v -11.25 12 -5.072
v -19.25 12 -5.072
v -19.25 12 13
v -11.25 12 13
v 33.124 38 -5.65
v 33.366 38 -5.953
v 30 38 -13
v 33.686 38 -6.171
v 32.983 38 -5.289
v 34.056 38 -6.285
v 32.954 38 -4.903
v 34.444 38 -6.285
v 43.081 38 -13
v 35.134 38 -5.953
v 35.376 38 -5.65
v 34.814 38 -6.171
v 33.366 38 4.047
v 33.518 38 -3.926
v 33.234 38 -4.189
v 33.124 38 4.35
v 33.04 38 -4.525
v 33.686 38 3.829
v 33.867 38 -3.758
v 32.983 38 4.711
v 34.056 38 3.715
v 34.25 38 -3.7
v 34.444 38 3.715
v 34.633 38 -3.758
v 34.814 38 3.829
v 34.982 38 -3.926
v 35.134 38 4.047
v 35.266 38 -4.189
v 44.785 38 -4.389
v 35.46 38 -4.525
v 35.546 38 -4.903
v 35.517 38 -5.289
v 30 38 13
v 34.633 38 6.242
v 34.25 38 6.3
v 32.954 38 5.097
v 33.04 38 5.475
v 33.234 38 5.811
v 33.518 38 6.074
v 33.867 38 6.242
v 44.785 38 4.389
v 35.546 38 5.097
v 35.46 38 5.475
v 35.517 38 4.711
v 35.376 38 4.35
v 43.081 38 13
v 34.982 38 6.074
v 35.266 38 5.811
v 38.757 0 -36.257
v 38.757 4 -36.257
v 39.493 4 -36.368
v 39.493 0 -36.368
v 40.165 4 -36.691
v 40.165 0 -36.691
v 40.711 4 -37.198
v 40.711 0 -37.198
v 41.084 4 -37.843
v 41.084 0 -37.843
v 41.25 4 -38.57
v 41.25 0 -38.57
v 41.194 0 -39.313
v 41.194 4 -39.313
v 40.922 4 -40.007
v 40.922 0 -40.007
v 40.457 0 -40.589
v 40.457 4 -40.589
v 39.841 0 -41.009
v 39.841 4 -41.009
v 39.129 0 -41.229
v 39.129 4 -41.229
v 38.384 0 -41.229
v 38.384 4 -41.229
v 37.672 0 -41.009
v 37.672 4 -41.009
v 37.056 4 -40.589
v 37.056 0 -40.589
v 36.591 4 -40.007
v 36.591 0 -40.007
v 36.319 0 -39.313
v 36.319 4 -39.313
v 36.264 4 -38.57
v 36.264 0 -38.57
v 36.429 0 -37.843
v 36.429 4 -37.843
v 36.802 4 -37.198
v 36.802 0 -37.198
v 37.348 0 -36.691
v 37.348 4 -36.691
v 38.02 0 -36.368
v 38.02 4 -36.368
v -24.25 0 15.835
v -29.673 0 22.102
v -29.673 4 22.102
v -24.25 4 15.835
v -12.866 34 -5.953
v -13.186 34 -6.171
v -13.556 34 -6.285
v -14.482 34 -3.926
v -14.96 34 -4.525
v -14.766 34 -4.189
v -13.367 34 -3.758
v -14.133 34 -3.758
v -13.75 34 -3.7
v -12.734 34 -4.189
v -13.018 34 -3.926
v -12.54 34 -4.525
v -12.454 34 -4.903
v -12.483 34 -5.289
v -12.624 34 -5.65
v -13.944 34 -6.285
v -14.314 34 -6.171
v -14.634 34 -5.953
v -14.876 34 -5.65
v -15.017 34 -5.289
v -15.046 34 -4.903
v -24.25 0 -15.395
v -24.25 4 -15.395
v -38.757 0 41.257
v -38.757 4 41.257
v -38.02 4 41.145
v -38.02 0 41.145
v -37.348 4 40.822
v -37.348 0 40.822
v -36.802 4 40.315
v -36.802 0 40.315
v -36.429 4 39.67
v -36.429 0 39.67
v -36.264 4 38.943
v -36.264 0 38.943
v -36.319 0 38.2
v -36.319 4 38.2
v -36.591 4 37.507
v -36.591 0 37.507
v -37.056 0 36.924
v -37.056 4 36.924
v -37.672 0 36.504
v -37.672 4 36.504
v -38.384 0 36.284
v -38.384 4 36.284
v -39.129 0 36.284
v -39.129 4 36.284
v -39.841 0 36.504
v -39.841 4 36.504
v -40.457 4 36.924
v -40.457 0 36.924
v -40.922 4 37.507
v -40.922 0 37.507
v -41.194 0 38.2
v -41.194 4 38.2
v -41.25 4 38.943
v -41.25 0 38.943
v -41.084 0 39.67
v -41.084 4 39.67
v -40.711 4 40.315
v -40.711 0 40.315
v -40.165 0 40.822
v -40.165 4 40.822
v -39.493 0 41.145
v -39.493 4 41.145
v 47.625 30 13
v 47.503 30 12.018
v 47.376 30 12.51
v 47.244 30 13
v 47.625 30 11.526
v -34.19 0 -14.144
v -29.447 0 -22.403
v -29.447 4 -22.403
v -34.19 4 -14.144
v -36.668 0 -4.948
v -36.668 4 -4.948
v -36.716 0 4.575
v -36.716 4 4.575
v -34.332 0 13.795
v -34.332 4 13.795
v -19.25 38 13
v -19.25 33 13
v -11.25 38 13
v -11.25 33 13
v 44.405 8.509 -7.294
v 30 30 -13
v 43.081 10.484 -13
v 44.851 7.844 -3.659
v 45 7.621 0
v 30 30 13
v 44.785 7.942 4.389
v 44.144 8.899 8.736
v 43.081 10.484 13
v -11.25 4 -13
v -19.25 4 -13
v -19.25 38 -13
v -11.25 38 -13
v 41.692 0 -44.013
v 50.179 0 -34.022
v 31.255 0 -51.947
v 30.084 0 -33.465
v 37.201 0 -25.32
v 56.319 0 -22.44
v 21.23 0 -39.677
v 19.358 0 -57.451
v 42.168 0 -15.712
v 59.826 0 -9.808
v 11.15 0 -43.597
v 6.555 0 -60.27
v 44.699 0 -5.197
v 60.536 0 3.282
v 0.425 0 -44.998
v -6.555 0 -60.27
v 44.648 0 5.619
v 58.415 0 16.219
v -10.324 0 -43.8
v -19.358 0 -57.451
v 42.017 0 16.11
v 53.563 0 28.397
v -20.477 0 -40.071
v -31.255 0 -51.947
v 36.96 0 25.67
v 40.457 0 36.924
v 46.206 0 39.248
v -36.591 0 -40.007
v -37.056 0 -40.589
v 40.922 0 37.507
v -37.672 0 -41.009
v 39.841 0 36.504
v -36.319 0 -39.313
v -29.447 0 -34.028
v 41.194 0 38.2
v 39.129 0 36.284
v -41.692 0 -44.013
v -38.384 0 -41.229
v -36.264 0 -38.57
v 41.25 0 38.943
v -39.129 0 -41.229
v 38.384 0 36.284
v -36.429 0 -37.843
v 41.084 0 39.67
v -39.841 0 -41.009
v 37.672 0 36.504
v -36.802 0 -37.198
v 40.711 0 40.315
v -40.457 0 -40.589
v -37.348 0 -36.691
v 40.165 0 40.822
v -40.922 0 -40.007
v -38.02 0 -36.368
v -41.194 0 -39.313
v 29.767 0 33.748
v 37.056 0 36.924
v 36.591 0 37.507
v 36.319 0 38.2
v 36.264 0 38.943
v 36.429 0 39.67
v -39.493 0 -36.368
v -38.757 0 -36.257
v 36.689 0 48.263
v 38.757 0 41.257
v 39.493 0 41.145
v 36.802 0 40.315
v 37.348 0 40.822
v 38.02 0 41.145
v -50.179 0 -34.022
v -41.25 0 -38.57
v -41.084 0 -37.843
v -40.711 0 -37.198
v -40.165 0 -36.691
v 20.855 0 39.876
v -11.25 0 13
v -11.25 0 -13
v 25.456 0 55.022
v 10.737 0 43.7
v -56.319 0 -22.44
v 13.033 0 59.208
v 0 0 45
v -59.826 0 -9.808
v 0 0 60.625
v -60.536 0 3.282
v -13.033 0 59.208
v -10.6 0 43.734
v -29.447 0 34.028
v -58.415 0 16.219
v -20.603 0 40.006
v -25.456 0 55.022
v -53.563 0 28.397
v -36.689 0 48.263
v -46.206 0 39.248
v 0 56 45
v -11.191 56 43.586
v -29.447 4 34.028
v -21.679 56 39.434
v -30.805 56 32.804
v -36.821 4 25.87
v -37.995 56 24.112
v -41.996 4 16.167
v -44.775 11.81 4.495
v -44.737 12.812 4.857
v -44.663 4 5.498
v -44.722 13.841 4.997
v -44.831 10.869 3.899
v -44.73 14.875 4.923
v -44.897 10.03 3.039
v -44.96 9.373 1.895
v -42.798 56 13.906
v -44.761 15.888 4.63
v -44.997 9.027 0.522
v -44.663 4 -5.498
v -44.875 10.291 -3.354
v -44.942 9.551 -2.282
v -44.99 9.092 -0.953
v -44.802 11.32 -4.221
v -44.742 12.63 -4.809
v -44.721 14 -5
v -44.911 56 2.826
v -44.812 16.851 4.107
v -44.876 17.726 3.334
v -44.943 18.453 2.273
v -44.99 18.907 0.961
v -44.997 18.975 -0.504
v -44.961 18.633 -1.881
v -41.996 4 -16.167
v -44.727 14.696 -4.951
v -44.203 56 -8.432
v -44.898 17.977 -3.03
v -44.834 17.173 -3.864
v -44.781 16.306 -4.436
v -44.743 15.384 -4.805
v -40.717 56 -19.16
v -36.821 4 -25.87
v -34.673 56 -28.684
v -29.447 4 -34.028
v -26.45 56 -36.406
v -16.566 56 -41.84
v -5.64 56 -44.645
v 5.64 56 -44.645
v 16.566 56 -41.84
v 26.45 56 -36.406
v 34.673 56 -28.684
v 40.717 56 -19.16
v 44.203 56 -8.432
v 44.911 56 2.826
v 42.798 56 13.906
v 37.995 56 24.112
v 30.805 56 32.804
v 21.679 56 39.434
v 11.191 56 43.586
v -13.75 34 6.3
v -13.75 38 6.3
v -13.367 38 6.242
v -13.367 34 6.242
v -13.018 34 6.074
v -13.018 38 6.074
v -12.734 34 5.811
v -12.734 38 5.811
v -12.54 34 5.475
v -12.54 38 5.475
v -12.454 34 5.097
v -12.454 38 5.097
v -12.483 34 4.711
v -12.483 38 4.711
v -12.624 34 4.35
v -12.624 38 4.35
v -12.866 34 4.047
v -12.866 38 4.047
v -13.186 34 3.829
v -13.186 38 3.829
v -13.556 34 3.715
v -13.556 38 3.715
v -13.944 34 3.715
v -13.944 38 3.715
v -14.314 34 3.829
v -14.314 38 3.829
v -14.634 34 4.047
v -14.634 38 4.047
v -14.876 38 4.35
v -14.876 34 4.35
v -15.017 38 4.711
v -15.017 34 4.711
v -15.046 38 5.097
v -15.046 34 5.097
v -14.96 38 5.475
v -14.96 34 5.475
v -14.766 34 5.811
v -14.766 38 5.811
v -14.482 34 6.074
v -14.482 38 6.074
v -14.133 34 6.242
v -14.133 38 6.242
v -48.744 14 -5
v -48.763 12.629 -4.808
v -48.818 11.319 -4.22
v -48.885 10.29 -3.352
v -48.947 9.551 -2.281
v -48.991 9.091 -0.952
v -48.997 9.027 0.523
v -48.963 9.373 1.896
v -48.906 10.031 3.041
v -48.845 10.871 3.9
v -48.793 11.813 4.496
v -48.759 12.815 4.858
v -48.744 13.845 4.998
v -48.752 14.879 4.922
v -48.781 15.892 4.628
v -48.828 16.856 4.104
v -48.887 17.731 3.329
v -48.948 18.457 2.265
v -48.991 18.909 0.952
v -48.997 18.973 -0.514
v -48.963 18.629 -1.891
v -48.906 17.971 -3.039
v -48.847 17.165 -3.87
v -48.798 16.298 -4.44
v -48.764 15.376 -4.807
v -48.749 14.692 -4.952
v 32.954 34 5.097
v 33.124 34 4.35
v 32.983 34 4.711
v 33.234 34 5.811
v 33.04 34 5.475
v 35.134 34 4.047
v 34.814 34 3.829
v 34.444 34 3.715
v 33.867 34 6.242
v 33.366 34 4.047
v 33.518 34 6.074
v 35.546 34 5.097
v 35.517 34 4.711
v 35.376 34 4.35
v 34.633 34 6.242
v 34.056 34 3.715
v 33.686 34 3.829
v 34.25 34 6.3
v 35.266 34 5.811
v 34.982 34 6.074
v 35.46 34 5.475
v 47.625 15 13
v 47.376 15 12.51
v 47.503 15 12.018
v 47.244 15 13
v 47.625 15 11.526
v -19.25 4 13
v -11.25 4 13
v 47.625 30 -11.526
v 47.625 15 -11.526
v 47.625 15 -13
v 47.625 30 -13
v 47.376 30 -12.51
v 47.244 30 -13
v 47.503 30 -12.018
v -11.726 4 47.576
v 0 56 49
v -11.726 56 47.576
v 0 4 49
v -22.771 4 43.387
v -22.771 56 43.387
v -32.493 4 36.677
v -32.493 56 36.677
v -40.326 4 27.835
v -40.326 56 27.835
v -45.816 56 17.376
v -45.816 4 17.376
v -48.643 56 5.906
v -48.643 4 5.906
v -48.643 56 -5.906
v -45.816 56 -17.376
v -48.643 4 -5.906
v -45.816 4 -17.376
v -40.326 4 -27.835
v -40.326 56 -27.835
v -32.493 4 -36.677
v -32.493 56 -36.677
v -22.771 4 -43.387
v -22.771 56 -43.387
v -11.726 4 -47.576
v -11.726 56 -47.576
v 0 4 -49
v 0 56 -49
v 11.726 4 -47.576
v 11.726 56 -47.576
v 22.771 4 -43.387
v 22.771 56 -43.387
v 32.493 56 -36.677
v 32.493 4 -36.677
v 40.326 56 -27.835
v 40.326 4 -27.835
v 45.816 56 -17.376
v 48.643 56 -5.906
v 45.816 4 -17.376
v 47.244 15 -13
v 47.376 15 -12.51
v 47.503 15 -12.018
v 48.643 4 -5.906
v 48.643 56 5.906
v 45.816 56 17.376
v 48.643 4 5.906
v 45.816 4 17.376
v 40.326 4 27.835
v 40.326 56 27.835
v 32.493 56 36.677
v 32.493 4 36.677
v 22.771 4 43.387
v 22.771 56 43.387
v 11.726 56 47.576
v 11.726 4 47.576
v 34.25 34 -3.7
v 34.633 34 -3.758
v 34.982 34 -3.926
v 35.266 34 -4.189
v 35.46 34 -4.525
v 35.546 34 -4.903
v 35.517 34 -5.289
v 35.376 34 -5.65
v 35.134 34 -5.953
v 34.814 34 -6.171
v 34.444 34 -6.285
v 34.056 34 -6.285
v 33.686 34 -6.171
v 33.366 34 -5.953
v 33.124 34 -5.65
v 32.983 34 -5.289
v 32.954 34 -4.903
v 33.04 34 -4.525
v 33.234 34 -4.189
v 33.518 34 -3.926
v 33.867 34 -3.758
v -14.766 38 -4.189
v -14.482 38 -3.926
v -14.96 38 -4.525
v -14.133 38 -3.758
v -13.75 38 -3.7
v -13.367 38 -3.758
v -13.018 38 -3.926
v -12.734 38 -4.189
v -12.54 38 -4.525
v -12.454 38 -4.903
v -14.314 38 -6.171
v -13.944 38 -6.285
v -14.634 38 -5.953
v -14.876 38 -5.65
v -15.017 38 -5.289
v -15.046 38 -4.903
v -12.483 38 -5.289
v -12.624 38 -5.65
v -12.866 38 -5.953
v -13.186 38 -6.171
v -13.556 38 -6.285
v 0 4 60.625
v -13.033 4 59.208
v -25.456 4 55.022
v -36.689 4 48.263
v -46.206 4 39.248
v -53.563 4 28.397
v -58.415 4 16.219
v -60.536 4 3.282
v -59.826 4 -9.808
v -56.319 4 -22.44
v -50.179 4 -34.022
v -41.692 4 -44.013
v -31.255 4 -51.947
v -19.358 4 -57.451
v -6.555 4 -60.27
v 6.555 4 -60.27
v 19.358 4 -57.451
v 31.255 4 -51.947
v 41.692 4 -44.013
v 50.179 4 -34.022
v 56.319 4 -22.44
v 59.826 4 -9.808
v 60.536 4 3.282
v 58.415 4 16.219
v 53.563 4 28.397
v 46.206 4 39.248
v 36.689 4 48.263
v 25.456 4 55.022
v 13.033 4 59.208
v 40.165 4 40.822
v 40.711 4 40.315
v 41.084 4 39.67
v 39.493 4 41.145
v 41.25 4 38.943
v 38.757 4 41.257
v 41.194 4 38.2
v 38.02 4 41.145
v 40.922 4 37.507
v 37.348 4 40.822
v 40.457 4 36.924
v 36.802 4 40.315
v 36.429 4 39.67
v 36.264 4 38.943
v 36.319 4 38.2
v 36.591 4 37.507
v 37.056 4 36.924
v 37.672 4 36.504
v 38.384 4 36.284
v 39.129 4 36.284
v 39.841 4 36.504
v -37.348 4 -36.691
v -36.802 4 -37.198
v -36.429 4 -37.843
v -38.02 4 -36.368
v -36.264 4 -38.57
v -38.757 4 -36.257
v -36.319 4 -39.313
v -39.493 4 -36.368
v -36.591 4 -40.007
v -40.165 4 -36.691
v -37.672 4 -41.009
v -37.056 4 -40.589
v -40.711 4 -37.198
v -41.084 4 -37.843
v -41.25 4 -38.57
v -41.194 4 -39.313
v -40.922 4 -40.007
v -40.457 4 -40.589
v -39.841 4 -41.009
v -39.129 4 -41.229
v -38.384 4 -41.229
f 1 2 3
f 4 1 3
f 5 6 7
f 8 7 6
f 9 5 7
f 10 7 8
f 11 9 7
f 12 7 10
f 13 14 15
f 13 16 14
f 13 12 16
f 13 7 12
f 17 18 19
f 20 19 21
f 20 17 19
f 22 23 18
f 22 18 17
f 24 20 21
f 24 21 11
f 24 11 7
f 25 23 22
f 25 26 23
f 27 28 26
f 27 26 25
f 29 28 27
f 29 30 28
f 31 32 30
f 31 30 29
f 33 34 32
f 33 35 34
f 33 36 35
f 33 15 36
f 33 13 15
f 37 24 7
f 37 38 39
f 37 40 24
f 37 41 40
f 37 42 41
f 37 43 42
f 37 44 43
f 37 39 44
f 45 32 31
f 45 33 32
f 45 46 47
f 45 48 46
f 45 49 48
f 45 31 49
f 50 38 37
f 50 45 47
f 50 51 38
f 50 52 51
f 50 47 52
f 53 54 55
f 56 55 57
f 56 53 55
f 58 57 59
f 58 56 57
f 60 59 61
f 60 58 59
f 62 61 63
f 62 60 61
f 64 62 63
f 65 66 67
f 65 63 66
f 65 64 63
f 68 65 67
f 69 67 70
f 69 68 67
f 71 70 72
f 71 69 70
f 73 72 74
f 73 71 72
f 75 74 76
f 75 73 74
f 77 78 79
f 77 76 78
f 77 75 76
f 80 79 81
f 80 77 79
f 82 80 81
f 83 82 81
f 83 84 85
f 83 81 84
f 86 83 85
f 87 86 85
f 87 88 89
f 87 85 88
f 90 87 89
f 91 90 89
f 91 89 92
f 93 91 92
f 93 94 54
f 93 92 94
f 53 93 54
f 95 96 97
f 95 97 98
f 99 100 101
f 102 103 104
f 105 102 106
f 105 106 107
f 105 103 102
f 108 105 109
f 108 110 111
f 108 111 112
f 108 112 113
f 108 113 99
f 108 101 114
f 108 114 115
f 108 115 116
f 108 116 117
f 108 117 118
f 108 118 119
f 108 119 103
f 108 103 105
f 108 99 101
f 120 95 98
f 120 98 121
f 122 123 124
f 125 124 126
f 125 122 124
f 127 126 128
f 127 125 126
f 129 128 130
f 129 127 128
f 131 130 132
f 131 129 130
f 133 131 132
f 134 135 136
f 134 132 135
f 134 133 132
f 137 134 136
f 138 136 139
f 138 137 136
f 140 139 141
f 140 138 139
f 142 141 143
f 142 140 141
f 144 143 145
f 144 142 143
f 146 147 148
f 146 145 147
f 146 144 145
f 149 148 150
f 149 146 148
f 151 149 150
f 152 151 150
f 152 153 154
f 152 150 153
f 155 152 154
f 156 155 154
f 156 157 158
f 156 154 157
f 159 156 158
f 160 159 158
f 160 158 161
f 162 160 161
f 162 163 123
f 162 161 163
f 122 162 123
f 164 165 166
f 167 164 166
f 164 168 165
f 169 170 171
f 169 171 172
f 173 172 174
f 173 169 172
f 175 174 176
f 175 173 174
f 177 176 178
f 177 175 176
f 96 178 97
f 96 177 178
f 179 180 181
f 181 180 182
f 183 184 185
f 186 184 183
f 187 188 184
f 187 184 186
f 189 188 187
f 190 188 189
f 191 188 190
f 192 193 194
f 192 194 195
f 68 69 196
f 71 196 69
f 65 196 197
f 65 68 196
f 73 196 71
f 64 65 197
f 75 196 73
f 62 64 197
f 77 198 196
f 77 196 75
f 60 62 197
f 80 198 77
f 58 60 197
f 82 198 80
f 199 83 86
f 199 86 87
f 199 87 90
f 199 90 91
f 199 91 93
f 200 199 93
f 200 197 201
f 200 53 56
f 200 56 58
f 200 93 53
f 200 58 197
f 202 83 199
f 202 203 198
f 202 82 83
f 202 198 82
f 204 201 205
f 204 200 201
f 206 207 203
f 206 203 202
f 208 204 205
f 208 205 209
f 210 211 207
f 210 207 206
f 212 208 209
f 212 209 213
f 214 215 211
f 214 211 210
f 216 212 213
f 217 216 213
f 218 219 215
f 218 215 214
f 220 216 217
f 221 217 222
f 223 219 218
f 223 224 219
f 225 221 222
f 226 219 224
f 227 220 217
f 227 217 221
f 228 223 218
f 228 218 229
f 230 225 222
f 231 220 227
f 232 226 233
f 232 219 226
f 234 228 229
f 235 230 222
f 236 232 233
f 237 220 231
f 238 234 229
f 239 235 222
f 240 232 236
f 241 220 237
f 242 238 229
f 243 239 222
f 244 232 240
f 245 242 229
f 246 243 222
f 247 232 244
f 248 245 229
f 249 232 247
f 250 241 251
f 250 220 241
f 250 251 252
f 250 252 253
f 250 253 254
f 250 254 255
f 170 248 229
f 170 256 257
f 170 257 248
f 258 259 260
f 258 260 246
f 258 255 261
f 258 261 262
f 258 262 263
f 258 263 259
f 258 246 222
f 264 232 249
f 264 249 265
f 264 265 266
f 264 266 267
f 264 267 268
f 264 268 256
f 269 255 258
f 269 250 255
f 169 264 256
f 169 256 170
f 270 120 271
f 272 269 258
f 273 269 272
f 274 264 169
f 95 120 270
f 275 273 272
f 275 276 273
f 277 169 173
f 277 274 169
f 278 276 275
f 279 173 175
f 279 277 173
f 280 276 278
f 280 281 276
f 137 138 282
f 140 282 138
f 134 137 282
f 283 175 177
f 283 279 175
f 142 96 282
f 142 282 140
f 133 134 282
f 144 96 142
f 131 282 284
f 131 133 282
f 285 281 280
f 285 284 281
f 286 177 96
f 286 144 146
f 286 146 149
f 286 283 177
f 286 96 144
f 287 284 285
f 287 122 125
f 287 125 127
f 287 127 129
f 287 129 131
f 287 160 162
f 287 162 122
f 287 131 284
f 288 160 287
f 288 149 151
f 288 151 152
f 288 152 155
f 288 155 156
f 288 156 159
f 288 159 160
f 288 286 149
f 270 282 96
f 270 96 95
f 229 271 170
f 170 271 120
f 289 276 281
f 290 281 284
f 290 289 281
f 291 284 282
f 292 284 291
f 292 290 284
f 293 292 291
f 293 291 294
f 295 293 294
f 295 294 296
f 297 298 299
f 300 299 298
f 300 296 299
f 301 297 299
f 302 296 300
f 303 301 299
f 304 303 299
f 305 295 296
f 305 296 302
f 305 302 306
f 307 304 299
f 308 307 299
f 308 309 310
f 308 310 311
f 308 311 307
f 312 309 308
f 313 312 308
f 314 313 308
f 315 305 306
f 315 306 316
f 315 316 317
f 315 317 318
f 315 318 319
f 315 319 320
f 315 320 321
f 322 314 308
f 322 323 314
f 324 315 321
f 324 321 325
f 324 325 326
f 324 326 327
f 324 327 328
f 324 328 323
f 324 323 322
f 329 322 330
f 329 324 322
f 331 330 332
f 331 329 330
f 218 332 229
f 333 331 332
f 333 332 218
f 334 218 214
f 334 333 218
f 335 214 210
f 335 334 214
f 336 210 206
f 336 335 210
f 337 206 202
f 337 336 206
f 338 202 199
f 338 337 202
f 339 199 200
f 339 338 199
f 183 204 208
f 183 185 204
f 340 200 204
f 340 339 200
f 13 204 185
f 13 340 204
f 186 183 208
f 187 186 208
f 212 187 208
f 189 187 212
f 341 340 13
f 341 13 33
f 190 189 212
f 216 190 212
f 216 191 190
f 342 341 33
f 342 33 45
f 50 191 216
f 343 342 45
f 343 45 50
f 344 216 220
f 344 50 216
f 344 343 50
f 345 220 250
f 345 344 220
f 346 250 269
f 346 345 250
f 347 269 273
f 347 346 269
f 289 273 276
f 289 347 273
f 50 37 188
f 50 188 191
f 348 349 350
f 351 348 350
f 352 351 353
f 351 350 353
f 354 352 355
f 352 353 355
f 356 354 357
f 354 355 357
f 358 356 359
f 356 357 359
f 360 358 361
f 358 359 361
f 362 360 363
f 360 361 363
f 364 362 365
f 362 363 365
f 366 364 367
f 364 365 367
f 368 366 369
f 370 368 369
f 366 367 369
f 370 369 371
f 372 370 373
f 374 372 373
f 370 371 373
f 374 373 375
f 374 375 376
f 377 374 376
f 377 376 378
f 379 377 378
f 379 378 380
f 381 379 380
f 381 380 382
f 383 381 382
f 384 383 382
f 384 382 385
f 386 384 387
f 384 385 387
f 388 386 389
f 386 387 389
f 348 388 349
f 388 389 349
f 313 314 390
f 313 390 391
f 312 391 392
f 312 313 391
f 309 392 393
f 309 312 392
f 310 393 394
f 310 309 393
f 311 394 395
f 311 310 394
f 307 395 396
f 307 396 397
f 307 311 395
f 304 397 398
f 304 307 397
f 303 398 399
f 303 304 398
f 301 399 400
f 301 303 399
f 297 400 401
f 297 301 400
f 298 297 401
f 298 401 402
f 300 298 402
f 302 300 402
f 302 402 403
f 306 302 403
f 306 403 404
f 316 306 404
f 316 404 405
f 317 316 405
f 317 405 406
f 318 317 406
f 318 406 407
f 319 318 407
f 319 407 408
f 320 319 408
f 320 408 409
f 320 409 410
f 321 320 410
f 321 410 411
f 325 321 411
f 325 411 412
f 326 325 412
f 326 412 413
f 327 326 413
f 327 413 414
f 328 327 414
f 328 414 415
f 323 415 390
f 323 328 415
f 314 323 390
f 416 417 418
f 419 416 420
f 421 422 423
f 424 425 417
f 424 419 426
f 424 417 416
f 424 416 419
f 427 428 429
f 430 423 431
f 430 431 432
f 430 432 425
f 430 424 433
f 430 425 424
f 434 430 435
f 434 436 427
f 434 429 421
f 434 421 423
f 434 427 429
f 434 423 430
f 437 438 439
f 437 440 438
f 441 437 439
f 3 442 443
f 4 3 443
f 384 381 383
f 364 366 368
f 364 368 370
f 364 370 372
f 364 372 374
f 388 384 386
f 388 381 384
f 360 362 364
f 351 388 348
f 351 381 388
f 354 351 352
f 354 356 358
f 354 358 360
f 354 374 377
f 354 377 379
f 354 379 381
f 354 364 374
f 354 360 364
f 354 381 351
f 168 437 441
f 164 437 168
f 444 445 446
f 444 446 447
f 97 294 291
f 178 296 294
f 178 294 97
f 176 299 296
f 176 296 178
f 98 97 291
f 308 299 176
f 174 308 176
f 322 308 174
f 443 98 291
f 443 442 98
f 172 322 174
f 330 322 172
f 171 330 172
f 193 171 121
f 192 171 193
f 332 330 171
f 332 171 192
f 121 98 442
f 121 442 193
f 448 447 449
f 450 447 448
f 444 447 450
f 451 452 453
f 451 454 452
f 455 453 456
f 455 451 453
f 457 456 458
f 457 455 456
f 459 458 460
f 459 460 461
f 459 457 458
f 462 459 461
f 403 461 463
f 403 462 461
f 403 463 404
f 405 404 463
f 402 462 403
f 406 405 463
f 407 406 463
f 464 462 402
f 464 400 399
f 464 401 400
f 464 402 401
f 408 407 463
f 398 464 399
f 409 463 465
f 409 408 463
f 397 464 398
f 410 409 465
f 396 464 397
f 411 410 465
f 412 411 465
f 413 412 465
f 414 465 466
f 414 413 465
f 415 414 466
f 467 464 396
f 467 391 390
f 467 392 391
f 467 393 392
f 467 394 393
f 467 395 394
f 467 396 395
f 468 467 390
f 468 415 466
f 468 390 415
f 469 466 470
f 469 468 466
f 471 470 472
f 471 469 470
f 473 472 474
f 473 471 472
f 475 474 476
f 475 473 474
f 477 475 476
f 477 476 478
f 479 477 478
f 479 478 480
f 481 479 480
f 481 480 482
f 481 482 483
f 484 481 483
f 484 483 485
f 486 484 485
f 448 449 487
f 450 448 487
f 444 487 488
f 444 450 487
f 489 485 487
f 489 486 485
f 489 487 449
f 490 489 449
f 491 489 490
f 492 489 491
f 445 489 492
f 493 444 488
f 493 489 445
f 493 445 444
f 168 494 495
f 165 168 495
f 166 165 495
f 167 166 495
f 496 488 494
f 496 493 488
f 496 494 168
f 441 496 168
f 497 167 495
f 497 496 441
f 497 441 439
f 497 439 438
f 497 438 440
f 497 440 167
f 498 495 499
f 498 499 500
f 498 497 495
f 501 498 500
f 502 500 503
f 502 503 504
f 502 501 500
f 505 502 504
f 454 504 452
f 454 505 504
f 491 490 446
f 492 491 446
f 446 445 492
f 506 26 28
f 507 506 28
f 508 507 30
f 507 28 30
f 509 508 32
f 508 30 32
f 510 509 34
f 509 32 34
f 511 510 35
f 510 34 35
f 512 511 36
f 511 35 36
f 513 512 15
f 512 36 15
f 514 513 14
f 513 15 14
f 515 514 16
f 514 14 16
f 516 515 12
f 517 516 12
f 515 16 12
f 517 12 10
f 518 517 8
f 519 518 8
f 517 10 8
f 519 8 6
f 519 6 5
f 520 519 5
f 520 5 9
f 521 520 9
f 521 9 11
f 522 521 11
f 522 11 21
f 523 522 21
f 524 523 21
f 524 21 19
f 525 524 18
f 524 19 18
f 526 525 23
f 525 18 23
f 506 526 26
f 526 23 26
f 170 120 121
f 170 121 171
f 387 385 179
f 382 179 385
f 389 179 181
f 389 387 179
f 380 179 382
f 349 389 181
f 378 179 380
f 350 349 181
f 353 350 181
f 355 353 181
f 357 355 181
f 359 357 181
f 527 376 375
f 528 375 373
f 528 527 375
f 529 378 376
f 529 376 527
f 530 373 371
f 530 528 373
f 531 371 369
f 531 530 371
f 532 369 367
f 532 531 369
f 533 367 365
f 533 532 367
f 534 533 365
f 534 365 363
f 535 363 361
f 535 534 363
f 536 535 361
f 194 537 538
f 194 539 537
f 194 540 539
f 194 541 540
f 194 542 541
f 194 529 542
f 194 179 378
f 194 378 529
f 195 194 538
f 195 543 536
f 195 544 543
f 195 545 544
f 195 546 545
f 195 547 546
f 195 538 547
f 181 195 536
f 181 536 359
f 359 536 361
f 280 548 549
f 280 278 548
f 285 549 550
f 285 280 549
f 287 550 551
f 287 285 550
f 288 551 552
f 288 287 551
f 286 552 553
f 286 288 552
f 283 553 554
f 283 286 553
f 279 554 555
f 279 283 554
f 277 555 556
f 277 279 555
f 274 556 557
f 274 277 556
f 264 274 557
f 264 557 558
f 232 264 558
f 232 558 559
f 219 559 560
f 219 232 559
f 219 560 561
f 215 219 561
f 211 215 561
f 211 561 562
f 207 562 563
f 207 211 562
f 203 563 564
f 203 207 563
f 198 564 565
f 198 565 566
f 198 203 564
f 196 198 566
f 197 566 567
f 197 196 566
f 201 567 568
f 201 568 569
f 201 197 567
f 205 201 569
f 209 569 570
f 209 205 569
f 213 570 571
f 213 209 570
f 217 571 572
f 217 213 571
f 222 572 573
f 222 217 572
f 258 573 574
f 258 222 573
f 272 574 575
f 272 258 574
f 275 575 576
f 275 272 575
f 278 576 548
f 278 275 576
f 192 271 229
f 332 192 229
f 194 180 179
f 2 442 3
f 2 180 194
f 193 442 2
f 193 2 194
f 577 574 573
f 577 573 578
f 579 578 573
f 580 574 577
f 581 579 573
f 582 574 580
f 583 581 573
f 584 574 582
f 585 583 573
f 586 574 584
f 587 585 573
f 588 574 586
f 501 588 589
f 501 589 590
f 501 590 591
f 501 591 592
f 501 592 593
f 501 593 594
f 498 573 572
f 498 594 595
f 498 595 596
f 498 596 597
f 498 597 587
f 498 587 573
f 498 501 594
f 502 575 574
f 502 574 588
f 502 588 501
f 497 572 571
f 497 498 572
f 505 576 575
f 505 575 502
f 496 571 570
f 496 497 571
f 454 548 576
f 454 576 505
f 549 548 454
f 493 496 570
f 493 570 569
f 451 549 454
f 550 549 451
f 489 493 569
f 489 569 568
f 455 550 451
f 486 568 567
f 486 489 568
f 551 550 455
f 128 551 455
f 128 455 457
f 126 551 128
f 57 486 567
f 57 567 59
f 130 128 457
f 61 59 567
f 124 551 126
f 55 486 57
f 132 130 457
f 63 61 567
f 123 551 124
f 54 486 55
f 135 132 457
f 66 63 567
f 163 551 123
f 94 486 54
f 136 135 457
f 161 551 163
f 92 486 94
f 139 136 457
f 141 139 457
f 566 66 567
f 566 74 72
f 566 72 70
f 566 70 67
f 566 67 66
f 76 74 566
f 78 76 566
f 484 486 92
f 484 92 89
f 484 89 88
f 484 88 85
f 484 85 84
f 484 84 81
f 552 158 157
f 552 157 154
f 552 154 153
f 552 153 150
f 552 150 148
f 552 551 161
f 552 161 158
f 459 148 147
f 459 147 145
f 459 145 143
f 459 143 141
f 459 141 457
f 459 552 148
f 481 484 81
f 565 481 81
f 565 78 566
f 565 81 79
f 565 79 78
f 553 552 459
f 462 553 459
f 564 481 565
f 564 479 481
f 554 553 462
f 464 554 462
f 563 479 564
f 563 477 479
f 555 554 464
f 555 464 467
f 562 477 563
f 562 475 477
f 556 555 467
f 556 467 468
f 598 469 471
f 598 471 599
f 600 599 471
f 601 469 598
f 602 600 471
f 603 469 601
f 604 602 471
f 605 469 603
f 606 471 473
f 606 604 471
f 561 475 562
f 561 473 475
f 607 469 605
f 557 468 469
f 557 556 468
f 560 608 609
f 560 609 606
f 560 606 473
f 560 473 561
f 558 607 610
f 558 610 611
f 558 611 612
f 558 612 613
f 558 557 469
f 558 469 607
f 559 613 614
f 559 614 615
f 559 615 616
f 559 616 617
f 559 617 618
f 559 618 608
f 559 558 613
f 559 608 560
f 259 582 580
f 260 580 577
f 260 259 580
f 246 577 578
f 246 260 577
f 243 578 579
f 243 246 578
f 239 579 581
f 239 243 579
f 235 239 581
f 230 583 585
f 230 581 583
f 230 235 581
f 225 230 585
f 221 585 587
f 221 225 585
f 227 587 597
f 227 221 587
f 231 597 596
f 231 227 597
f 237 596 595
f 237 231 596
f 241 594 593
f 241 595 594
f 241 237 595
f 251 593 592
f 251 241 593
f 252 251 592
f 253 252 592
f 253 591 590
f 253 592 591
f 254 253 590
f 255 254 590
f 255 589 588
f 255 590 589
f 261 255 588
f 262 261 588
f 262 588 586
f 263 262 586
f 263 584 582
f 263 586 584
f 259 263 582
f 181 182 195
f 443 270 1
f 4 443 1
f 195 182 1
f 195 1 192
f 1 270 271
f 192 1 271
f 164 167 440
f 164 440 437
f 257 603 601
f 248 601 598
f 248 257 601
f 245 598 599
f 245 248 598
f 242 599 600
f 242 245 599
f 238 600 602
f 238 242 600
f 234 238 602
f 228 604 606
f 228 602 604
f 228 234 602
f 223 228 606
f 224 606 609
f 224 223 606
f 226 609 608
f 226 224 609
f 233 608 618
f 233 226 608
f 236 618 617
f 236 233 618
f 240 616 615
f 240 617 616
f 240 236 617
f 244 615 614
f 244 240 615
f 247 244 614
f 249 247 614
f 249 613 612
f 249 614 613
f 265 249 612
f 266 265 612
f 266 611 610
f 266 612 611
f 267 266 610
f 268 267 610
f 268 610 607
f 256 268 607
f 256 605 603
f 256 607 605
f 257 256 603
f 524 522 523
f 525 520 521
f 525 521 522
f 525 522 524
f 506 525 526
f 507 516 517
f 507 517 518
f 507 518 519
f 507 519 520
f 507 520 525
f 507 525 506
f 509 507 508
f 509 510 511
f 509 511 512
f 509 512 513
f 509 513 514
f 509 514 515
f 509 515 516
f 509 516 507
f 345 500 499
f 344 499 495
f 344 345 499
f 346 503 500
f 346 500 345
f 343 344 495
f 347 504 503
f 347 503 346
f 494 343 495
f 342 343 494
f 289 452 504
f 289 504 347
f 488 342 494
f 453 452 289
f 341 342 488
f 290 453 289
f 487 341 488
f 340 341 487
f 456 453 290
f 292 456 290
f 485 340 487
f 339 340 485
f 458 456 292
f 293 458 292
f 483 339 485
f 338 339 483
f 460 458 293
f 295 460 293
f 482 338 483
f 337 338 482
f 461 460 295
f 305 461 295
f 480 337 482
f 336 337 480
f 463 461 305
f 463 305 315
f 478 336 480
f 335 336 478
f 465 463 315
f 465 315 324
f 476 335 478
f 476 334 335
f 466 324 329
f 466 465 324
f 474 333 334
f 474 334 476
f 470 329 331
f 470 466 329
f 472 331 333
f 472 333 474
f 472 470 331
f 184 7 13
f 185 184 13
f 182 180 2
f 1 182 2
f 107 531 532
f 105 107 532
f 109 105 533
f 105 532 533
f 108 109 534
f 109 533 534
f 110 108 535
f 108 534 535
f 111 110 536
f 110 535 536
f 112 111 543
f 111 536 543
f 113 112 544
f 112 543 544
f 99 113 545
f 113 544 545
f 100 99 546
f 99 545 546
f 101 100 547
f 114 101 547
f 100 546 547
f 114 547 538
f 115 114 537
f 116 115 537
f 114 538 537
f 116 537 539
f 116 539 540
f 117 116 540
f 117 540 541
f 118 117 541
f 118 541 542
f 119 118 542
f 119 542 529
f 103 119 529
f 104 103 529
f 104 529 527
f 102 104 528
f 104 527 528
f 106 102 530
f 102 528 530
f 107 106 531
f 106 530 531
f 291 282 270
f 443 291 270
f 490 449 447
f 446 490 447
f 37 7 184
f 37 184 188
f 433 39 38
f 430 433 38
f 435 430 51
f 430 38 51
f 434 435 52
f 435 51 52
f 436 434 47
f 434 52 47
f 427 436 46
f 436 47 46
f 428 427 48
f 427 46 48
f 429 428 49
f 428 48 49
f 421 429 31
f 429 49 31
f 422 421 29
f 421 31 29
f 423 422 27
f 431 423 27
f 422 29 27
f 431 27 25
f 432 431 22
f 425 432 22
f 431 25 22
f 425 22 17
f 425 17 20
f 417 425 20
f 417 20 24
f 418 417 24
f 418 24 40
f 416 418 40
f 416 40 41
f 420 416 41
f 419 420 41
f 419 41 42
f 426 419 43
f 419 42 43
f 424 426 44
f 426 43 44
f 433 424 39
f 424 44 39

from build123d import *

# Parameters (mm, degrees)
IZIM7_W                     = 26
IZIM7_H                     = 8
Y_KSEKLIK_EKSTR_ZYON3_DEPTH = 15
IZIM8_W                     = 8
IZIM8_H                     = 26
Y_KSEKLIK_EKSTR_ZYON4_DEPTH = 4
IZIM9_W                     = 8
IZIM9_H                     = 26
Y_KSEKLIK_EKSTR_ZYON5_DEPTH = 38
IZIM11_R                    = 5
KES_EKSTR_ZYON1_DEPTH       = 44
IZIM12_R                    = 2.5
KES_EKSTR_ZYON2_DEPTH       = 44
IZIM14_R                    = 1.3
KES_EKSTR_ZYON3_DEPTH       = 4
KES_EKSTR_ZYON4_DEPTH       = 10
Y_KSEKLIK_EKSTR_ZYON6_DEPTH = 26
KES_EKSTR_ZYON5_DEPTH       = 30
Y_KSEKLIK_EKSTR_ZYON7_DEPTH = 26
Y_KSEKLIK_EKSTR_ZYON8_DEPTH = 26
KES_EKSTR_ZYON6_DEPTH       = 26


with BuildPart() as part:
    # Çizim1 → Döndür5 (revolve)
    with BuildSketch(Plane.XY, mode=Mode.PRIVATE) as d_nd_r5_sk:
        Polygon((49, 4), (60.625, 4), (60.625, 0), (45, 0), (45, 56), (49, 56), align=None)
    revolve(d_nd_r5_sk.sketch.rotate(Axis((0, 14.385693044, 0), (0, -1, 0)), 90), axis=Axis((0, 14.385693044, 0), (0, -1, 0)))

    # Çizim7 → Yükseklik-Ekstrüzyon3 (add)
    with BuildSketch(Plane.ZY.offset(-45)):
        with Locations((0, 34)):
            Rectangle(IZIM7_W, IZIM7_H)
    extrude(amount=Y_KSEKLIK_EKSTR_ZYON3_DEPTH)

    # Çizim8 → Yükseklik-Ekstrüzyon4 (add)
    with BuildSketch(Plane(origin=(0, 0, 0), x_dir=(1, 0, 0), z_dir=(0, 1, 0))):
        with Locations((-15.25, 0)):
            Rectangle(IZIM8_W, IZIM8_H)
        with BuildLine():
            Line((-11.25, 13), (-29.4469535, 34.027590711))
            ThreePointArc((-29.4469535, 34.027590711), (-45, 0), (-29.4469535, -34.027590711))
            Line((-29.4469535, -34.027590711), (-11.25, -13))
            Line((-11.25, -13), (-19.25, -13))
            Line((-19.25, -13), (-19.25, 13))
            Line((-19.25, 13), (-11.25, 13))
        make_face()
        with BuildLine():
            ThreePointArc((-29.4469535, 22.402609883), (-36.999521245, 0.188222241), (-29.673354544, -22.101855807))
            Line((-29.673354544, -22.101855807), (-24.25, -15.834868333))
            Line((-24.25, -15.834868333), (-24.25, 15.394791201))
            Line((-24.25, 15.394791201), (-29.4469535, 22.402609883))
        make_face(mode=Mode.SUBTRACT)
    extrude(amount=Y_KSEKLIK_EKSTR_ZYON4_DEPTH)

    # Çizim9 → Yükseklik-Ekstrüzyon5 (add)
    with BuildSketch(Plane(origin=(0, 0, 0), x_dir=(1, 0, 0), z_dir=(0, 1, 0))):
        with Locations((-15.25, 0)):
            Rectangle(IZIM9_W, IZIM9_H)
    extrude(amount=Y_KSEKLIK_EKSTR_ZYON5_DEPTH)

    # Çizim11 → Kes-Ekstrüzyon1 (cut)
    with BuildSketch(Plane.ZY.offset(19.25)):
        with Locations(Location((0, 14, 0), (0, 0, 180))):
            Circle(IZIM11_R)
    extrude(amount=KES_EKSTR_ZYON1_DEPTH, mode=Mode.SUBTRACT)

    # Çizim12 → Kes-Ekstrüzyon2 (cut)
    with BuildSketch(Plane(origin=(0, 0, 0), x_dir=(1, 0, 0), z_dir=(0, 1, 0))):
        with Locations(Location((-38.756522677, 38.756522677, 0), (0, 0, 270))):
            Circle(IZIM12_R)
        with Locations(Location((38.756522677, 38.756522677, 0), (0, 0, 270))):
            Circle(IZIM12_R)
        with Locations(Location((-38.756522677, -38.756522677, 0), (0, 0, 270))):
            Circle(IZIM12_R)
        with Locations(Location((38.756522677, -38.756522677, 0), (0, 0, 270))):
            Circle(IZIM12_R)
    extrude(amount=KES_EKSTR_ZYON2_DEPTH, mode=Mode.SUBTRACT)

    # Çizim14 → Kes-Ekstrüzyon3 (cut)
    with BuildSketch(Plane(origin=(0, 38, 0), x_dir=(1, 0, 0), z_dir=(0, 1, 0))):
        with Locations(Location((-13.75, 5, 0), (0, 0, 270))):
            Circle(IZIM14_R)
        with Locations(Location((-13.75, -5, 0), (0, 0, 270))):
            Circle(IZIM14_R)
        with Locations(Location((34.25, -5, 0), (0, 0, 270))):
            Circle(IZIM14_R)
        with Locations(Location((34.25, 5, 0), (0, 0, 270))):
            Circle(IZIM14_R)
    extrude(amount=-KES_EKSTR_ZYON3_DEPTH, mode=Mode.SUBTRACT)

    # Çizim15 → Kes-Ekstrüzyon4 (cut)
    with BuildSketch(Plane.ZY.offset(19.25)):
        Polygon((13, 30.072092804), (-5.072092804, 12), (13, 12), align=None)
    extrude(amount=-KES_EKSTR_ZYON4_DEPTH, mode=Mode.SUBTRACT)

    # Çizim16 → Yükseklik-Ekstrüzyon6 (add)
    with BuildSketch(Plane.XY.offset(13)):
        Polygon((30, 30), (45.409856654, 14.590143346), (45.409856654, 30), align=None)
    extrude(amount=-Y_KSEKLIK_EKSTR_ZYON6_DEPTH)

    # Çizim17 → Kes-Ekstrüzyon5 (cut)
    with BuildSketch(Plane(origin=(0, 0, 0), x_dir=(1, 0, 0), z_dir=(0, 1, 0))):
        with BuildLine():
            Line((0, -45), (0, 45))
            ThreePointArc((0, 45), (45, 0), (0, -45))
        make_face()
    extrude(amount=KES_EKSTR_ZYON5_DEPTH, mode=Mode.SUBTRACT)

    # Çizim18 → Yükseklik-Ekstrüzyon7 (add)
    with BuildSketch(Plane.XY.offset(13)):
        Polygon((43.081318457, 30), (30, 30), (45, 15), (47.625193475, 15), (47.625193475, 30), align=None)
    extrude(amount=-Y_KSEKLIK_EKSTR_ZYON7_DEPTH)

    # Çizim19 → Yükseklik-Ekstrüzyon8 (add)
    with BuildSketch(Plane.XY.offset(13)):
        Polygon((30, 30), (45, 7.621420501), (46.501965359, 7.621420501), (46.501965359, 30), align=None)
    extrude(amount=-Y_KSEKLIK_EKSTR_ZYON8_DEPTH)

    # Çizim20 → Kes-Ekstrüzyon6 (cut)
    with BuildSketch(Plane.ZY.offset(19.25)):
        Polygon((13, 33), (-5.072092804, 12), (13, 12), align=None)
    extrude(amount=-KES_EKSTR_ZYON6_DEPTH, mode=Mode.SUBTRACT)


solid = part.part
